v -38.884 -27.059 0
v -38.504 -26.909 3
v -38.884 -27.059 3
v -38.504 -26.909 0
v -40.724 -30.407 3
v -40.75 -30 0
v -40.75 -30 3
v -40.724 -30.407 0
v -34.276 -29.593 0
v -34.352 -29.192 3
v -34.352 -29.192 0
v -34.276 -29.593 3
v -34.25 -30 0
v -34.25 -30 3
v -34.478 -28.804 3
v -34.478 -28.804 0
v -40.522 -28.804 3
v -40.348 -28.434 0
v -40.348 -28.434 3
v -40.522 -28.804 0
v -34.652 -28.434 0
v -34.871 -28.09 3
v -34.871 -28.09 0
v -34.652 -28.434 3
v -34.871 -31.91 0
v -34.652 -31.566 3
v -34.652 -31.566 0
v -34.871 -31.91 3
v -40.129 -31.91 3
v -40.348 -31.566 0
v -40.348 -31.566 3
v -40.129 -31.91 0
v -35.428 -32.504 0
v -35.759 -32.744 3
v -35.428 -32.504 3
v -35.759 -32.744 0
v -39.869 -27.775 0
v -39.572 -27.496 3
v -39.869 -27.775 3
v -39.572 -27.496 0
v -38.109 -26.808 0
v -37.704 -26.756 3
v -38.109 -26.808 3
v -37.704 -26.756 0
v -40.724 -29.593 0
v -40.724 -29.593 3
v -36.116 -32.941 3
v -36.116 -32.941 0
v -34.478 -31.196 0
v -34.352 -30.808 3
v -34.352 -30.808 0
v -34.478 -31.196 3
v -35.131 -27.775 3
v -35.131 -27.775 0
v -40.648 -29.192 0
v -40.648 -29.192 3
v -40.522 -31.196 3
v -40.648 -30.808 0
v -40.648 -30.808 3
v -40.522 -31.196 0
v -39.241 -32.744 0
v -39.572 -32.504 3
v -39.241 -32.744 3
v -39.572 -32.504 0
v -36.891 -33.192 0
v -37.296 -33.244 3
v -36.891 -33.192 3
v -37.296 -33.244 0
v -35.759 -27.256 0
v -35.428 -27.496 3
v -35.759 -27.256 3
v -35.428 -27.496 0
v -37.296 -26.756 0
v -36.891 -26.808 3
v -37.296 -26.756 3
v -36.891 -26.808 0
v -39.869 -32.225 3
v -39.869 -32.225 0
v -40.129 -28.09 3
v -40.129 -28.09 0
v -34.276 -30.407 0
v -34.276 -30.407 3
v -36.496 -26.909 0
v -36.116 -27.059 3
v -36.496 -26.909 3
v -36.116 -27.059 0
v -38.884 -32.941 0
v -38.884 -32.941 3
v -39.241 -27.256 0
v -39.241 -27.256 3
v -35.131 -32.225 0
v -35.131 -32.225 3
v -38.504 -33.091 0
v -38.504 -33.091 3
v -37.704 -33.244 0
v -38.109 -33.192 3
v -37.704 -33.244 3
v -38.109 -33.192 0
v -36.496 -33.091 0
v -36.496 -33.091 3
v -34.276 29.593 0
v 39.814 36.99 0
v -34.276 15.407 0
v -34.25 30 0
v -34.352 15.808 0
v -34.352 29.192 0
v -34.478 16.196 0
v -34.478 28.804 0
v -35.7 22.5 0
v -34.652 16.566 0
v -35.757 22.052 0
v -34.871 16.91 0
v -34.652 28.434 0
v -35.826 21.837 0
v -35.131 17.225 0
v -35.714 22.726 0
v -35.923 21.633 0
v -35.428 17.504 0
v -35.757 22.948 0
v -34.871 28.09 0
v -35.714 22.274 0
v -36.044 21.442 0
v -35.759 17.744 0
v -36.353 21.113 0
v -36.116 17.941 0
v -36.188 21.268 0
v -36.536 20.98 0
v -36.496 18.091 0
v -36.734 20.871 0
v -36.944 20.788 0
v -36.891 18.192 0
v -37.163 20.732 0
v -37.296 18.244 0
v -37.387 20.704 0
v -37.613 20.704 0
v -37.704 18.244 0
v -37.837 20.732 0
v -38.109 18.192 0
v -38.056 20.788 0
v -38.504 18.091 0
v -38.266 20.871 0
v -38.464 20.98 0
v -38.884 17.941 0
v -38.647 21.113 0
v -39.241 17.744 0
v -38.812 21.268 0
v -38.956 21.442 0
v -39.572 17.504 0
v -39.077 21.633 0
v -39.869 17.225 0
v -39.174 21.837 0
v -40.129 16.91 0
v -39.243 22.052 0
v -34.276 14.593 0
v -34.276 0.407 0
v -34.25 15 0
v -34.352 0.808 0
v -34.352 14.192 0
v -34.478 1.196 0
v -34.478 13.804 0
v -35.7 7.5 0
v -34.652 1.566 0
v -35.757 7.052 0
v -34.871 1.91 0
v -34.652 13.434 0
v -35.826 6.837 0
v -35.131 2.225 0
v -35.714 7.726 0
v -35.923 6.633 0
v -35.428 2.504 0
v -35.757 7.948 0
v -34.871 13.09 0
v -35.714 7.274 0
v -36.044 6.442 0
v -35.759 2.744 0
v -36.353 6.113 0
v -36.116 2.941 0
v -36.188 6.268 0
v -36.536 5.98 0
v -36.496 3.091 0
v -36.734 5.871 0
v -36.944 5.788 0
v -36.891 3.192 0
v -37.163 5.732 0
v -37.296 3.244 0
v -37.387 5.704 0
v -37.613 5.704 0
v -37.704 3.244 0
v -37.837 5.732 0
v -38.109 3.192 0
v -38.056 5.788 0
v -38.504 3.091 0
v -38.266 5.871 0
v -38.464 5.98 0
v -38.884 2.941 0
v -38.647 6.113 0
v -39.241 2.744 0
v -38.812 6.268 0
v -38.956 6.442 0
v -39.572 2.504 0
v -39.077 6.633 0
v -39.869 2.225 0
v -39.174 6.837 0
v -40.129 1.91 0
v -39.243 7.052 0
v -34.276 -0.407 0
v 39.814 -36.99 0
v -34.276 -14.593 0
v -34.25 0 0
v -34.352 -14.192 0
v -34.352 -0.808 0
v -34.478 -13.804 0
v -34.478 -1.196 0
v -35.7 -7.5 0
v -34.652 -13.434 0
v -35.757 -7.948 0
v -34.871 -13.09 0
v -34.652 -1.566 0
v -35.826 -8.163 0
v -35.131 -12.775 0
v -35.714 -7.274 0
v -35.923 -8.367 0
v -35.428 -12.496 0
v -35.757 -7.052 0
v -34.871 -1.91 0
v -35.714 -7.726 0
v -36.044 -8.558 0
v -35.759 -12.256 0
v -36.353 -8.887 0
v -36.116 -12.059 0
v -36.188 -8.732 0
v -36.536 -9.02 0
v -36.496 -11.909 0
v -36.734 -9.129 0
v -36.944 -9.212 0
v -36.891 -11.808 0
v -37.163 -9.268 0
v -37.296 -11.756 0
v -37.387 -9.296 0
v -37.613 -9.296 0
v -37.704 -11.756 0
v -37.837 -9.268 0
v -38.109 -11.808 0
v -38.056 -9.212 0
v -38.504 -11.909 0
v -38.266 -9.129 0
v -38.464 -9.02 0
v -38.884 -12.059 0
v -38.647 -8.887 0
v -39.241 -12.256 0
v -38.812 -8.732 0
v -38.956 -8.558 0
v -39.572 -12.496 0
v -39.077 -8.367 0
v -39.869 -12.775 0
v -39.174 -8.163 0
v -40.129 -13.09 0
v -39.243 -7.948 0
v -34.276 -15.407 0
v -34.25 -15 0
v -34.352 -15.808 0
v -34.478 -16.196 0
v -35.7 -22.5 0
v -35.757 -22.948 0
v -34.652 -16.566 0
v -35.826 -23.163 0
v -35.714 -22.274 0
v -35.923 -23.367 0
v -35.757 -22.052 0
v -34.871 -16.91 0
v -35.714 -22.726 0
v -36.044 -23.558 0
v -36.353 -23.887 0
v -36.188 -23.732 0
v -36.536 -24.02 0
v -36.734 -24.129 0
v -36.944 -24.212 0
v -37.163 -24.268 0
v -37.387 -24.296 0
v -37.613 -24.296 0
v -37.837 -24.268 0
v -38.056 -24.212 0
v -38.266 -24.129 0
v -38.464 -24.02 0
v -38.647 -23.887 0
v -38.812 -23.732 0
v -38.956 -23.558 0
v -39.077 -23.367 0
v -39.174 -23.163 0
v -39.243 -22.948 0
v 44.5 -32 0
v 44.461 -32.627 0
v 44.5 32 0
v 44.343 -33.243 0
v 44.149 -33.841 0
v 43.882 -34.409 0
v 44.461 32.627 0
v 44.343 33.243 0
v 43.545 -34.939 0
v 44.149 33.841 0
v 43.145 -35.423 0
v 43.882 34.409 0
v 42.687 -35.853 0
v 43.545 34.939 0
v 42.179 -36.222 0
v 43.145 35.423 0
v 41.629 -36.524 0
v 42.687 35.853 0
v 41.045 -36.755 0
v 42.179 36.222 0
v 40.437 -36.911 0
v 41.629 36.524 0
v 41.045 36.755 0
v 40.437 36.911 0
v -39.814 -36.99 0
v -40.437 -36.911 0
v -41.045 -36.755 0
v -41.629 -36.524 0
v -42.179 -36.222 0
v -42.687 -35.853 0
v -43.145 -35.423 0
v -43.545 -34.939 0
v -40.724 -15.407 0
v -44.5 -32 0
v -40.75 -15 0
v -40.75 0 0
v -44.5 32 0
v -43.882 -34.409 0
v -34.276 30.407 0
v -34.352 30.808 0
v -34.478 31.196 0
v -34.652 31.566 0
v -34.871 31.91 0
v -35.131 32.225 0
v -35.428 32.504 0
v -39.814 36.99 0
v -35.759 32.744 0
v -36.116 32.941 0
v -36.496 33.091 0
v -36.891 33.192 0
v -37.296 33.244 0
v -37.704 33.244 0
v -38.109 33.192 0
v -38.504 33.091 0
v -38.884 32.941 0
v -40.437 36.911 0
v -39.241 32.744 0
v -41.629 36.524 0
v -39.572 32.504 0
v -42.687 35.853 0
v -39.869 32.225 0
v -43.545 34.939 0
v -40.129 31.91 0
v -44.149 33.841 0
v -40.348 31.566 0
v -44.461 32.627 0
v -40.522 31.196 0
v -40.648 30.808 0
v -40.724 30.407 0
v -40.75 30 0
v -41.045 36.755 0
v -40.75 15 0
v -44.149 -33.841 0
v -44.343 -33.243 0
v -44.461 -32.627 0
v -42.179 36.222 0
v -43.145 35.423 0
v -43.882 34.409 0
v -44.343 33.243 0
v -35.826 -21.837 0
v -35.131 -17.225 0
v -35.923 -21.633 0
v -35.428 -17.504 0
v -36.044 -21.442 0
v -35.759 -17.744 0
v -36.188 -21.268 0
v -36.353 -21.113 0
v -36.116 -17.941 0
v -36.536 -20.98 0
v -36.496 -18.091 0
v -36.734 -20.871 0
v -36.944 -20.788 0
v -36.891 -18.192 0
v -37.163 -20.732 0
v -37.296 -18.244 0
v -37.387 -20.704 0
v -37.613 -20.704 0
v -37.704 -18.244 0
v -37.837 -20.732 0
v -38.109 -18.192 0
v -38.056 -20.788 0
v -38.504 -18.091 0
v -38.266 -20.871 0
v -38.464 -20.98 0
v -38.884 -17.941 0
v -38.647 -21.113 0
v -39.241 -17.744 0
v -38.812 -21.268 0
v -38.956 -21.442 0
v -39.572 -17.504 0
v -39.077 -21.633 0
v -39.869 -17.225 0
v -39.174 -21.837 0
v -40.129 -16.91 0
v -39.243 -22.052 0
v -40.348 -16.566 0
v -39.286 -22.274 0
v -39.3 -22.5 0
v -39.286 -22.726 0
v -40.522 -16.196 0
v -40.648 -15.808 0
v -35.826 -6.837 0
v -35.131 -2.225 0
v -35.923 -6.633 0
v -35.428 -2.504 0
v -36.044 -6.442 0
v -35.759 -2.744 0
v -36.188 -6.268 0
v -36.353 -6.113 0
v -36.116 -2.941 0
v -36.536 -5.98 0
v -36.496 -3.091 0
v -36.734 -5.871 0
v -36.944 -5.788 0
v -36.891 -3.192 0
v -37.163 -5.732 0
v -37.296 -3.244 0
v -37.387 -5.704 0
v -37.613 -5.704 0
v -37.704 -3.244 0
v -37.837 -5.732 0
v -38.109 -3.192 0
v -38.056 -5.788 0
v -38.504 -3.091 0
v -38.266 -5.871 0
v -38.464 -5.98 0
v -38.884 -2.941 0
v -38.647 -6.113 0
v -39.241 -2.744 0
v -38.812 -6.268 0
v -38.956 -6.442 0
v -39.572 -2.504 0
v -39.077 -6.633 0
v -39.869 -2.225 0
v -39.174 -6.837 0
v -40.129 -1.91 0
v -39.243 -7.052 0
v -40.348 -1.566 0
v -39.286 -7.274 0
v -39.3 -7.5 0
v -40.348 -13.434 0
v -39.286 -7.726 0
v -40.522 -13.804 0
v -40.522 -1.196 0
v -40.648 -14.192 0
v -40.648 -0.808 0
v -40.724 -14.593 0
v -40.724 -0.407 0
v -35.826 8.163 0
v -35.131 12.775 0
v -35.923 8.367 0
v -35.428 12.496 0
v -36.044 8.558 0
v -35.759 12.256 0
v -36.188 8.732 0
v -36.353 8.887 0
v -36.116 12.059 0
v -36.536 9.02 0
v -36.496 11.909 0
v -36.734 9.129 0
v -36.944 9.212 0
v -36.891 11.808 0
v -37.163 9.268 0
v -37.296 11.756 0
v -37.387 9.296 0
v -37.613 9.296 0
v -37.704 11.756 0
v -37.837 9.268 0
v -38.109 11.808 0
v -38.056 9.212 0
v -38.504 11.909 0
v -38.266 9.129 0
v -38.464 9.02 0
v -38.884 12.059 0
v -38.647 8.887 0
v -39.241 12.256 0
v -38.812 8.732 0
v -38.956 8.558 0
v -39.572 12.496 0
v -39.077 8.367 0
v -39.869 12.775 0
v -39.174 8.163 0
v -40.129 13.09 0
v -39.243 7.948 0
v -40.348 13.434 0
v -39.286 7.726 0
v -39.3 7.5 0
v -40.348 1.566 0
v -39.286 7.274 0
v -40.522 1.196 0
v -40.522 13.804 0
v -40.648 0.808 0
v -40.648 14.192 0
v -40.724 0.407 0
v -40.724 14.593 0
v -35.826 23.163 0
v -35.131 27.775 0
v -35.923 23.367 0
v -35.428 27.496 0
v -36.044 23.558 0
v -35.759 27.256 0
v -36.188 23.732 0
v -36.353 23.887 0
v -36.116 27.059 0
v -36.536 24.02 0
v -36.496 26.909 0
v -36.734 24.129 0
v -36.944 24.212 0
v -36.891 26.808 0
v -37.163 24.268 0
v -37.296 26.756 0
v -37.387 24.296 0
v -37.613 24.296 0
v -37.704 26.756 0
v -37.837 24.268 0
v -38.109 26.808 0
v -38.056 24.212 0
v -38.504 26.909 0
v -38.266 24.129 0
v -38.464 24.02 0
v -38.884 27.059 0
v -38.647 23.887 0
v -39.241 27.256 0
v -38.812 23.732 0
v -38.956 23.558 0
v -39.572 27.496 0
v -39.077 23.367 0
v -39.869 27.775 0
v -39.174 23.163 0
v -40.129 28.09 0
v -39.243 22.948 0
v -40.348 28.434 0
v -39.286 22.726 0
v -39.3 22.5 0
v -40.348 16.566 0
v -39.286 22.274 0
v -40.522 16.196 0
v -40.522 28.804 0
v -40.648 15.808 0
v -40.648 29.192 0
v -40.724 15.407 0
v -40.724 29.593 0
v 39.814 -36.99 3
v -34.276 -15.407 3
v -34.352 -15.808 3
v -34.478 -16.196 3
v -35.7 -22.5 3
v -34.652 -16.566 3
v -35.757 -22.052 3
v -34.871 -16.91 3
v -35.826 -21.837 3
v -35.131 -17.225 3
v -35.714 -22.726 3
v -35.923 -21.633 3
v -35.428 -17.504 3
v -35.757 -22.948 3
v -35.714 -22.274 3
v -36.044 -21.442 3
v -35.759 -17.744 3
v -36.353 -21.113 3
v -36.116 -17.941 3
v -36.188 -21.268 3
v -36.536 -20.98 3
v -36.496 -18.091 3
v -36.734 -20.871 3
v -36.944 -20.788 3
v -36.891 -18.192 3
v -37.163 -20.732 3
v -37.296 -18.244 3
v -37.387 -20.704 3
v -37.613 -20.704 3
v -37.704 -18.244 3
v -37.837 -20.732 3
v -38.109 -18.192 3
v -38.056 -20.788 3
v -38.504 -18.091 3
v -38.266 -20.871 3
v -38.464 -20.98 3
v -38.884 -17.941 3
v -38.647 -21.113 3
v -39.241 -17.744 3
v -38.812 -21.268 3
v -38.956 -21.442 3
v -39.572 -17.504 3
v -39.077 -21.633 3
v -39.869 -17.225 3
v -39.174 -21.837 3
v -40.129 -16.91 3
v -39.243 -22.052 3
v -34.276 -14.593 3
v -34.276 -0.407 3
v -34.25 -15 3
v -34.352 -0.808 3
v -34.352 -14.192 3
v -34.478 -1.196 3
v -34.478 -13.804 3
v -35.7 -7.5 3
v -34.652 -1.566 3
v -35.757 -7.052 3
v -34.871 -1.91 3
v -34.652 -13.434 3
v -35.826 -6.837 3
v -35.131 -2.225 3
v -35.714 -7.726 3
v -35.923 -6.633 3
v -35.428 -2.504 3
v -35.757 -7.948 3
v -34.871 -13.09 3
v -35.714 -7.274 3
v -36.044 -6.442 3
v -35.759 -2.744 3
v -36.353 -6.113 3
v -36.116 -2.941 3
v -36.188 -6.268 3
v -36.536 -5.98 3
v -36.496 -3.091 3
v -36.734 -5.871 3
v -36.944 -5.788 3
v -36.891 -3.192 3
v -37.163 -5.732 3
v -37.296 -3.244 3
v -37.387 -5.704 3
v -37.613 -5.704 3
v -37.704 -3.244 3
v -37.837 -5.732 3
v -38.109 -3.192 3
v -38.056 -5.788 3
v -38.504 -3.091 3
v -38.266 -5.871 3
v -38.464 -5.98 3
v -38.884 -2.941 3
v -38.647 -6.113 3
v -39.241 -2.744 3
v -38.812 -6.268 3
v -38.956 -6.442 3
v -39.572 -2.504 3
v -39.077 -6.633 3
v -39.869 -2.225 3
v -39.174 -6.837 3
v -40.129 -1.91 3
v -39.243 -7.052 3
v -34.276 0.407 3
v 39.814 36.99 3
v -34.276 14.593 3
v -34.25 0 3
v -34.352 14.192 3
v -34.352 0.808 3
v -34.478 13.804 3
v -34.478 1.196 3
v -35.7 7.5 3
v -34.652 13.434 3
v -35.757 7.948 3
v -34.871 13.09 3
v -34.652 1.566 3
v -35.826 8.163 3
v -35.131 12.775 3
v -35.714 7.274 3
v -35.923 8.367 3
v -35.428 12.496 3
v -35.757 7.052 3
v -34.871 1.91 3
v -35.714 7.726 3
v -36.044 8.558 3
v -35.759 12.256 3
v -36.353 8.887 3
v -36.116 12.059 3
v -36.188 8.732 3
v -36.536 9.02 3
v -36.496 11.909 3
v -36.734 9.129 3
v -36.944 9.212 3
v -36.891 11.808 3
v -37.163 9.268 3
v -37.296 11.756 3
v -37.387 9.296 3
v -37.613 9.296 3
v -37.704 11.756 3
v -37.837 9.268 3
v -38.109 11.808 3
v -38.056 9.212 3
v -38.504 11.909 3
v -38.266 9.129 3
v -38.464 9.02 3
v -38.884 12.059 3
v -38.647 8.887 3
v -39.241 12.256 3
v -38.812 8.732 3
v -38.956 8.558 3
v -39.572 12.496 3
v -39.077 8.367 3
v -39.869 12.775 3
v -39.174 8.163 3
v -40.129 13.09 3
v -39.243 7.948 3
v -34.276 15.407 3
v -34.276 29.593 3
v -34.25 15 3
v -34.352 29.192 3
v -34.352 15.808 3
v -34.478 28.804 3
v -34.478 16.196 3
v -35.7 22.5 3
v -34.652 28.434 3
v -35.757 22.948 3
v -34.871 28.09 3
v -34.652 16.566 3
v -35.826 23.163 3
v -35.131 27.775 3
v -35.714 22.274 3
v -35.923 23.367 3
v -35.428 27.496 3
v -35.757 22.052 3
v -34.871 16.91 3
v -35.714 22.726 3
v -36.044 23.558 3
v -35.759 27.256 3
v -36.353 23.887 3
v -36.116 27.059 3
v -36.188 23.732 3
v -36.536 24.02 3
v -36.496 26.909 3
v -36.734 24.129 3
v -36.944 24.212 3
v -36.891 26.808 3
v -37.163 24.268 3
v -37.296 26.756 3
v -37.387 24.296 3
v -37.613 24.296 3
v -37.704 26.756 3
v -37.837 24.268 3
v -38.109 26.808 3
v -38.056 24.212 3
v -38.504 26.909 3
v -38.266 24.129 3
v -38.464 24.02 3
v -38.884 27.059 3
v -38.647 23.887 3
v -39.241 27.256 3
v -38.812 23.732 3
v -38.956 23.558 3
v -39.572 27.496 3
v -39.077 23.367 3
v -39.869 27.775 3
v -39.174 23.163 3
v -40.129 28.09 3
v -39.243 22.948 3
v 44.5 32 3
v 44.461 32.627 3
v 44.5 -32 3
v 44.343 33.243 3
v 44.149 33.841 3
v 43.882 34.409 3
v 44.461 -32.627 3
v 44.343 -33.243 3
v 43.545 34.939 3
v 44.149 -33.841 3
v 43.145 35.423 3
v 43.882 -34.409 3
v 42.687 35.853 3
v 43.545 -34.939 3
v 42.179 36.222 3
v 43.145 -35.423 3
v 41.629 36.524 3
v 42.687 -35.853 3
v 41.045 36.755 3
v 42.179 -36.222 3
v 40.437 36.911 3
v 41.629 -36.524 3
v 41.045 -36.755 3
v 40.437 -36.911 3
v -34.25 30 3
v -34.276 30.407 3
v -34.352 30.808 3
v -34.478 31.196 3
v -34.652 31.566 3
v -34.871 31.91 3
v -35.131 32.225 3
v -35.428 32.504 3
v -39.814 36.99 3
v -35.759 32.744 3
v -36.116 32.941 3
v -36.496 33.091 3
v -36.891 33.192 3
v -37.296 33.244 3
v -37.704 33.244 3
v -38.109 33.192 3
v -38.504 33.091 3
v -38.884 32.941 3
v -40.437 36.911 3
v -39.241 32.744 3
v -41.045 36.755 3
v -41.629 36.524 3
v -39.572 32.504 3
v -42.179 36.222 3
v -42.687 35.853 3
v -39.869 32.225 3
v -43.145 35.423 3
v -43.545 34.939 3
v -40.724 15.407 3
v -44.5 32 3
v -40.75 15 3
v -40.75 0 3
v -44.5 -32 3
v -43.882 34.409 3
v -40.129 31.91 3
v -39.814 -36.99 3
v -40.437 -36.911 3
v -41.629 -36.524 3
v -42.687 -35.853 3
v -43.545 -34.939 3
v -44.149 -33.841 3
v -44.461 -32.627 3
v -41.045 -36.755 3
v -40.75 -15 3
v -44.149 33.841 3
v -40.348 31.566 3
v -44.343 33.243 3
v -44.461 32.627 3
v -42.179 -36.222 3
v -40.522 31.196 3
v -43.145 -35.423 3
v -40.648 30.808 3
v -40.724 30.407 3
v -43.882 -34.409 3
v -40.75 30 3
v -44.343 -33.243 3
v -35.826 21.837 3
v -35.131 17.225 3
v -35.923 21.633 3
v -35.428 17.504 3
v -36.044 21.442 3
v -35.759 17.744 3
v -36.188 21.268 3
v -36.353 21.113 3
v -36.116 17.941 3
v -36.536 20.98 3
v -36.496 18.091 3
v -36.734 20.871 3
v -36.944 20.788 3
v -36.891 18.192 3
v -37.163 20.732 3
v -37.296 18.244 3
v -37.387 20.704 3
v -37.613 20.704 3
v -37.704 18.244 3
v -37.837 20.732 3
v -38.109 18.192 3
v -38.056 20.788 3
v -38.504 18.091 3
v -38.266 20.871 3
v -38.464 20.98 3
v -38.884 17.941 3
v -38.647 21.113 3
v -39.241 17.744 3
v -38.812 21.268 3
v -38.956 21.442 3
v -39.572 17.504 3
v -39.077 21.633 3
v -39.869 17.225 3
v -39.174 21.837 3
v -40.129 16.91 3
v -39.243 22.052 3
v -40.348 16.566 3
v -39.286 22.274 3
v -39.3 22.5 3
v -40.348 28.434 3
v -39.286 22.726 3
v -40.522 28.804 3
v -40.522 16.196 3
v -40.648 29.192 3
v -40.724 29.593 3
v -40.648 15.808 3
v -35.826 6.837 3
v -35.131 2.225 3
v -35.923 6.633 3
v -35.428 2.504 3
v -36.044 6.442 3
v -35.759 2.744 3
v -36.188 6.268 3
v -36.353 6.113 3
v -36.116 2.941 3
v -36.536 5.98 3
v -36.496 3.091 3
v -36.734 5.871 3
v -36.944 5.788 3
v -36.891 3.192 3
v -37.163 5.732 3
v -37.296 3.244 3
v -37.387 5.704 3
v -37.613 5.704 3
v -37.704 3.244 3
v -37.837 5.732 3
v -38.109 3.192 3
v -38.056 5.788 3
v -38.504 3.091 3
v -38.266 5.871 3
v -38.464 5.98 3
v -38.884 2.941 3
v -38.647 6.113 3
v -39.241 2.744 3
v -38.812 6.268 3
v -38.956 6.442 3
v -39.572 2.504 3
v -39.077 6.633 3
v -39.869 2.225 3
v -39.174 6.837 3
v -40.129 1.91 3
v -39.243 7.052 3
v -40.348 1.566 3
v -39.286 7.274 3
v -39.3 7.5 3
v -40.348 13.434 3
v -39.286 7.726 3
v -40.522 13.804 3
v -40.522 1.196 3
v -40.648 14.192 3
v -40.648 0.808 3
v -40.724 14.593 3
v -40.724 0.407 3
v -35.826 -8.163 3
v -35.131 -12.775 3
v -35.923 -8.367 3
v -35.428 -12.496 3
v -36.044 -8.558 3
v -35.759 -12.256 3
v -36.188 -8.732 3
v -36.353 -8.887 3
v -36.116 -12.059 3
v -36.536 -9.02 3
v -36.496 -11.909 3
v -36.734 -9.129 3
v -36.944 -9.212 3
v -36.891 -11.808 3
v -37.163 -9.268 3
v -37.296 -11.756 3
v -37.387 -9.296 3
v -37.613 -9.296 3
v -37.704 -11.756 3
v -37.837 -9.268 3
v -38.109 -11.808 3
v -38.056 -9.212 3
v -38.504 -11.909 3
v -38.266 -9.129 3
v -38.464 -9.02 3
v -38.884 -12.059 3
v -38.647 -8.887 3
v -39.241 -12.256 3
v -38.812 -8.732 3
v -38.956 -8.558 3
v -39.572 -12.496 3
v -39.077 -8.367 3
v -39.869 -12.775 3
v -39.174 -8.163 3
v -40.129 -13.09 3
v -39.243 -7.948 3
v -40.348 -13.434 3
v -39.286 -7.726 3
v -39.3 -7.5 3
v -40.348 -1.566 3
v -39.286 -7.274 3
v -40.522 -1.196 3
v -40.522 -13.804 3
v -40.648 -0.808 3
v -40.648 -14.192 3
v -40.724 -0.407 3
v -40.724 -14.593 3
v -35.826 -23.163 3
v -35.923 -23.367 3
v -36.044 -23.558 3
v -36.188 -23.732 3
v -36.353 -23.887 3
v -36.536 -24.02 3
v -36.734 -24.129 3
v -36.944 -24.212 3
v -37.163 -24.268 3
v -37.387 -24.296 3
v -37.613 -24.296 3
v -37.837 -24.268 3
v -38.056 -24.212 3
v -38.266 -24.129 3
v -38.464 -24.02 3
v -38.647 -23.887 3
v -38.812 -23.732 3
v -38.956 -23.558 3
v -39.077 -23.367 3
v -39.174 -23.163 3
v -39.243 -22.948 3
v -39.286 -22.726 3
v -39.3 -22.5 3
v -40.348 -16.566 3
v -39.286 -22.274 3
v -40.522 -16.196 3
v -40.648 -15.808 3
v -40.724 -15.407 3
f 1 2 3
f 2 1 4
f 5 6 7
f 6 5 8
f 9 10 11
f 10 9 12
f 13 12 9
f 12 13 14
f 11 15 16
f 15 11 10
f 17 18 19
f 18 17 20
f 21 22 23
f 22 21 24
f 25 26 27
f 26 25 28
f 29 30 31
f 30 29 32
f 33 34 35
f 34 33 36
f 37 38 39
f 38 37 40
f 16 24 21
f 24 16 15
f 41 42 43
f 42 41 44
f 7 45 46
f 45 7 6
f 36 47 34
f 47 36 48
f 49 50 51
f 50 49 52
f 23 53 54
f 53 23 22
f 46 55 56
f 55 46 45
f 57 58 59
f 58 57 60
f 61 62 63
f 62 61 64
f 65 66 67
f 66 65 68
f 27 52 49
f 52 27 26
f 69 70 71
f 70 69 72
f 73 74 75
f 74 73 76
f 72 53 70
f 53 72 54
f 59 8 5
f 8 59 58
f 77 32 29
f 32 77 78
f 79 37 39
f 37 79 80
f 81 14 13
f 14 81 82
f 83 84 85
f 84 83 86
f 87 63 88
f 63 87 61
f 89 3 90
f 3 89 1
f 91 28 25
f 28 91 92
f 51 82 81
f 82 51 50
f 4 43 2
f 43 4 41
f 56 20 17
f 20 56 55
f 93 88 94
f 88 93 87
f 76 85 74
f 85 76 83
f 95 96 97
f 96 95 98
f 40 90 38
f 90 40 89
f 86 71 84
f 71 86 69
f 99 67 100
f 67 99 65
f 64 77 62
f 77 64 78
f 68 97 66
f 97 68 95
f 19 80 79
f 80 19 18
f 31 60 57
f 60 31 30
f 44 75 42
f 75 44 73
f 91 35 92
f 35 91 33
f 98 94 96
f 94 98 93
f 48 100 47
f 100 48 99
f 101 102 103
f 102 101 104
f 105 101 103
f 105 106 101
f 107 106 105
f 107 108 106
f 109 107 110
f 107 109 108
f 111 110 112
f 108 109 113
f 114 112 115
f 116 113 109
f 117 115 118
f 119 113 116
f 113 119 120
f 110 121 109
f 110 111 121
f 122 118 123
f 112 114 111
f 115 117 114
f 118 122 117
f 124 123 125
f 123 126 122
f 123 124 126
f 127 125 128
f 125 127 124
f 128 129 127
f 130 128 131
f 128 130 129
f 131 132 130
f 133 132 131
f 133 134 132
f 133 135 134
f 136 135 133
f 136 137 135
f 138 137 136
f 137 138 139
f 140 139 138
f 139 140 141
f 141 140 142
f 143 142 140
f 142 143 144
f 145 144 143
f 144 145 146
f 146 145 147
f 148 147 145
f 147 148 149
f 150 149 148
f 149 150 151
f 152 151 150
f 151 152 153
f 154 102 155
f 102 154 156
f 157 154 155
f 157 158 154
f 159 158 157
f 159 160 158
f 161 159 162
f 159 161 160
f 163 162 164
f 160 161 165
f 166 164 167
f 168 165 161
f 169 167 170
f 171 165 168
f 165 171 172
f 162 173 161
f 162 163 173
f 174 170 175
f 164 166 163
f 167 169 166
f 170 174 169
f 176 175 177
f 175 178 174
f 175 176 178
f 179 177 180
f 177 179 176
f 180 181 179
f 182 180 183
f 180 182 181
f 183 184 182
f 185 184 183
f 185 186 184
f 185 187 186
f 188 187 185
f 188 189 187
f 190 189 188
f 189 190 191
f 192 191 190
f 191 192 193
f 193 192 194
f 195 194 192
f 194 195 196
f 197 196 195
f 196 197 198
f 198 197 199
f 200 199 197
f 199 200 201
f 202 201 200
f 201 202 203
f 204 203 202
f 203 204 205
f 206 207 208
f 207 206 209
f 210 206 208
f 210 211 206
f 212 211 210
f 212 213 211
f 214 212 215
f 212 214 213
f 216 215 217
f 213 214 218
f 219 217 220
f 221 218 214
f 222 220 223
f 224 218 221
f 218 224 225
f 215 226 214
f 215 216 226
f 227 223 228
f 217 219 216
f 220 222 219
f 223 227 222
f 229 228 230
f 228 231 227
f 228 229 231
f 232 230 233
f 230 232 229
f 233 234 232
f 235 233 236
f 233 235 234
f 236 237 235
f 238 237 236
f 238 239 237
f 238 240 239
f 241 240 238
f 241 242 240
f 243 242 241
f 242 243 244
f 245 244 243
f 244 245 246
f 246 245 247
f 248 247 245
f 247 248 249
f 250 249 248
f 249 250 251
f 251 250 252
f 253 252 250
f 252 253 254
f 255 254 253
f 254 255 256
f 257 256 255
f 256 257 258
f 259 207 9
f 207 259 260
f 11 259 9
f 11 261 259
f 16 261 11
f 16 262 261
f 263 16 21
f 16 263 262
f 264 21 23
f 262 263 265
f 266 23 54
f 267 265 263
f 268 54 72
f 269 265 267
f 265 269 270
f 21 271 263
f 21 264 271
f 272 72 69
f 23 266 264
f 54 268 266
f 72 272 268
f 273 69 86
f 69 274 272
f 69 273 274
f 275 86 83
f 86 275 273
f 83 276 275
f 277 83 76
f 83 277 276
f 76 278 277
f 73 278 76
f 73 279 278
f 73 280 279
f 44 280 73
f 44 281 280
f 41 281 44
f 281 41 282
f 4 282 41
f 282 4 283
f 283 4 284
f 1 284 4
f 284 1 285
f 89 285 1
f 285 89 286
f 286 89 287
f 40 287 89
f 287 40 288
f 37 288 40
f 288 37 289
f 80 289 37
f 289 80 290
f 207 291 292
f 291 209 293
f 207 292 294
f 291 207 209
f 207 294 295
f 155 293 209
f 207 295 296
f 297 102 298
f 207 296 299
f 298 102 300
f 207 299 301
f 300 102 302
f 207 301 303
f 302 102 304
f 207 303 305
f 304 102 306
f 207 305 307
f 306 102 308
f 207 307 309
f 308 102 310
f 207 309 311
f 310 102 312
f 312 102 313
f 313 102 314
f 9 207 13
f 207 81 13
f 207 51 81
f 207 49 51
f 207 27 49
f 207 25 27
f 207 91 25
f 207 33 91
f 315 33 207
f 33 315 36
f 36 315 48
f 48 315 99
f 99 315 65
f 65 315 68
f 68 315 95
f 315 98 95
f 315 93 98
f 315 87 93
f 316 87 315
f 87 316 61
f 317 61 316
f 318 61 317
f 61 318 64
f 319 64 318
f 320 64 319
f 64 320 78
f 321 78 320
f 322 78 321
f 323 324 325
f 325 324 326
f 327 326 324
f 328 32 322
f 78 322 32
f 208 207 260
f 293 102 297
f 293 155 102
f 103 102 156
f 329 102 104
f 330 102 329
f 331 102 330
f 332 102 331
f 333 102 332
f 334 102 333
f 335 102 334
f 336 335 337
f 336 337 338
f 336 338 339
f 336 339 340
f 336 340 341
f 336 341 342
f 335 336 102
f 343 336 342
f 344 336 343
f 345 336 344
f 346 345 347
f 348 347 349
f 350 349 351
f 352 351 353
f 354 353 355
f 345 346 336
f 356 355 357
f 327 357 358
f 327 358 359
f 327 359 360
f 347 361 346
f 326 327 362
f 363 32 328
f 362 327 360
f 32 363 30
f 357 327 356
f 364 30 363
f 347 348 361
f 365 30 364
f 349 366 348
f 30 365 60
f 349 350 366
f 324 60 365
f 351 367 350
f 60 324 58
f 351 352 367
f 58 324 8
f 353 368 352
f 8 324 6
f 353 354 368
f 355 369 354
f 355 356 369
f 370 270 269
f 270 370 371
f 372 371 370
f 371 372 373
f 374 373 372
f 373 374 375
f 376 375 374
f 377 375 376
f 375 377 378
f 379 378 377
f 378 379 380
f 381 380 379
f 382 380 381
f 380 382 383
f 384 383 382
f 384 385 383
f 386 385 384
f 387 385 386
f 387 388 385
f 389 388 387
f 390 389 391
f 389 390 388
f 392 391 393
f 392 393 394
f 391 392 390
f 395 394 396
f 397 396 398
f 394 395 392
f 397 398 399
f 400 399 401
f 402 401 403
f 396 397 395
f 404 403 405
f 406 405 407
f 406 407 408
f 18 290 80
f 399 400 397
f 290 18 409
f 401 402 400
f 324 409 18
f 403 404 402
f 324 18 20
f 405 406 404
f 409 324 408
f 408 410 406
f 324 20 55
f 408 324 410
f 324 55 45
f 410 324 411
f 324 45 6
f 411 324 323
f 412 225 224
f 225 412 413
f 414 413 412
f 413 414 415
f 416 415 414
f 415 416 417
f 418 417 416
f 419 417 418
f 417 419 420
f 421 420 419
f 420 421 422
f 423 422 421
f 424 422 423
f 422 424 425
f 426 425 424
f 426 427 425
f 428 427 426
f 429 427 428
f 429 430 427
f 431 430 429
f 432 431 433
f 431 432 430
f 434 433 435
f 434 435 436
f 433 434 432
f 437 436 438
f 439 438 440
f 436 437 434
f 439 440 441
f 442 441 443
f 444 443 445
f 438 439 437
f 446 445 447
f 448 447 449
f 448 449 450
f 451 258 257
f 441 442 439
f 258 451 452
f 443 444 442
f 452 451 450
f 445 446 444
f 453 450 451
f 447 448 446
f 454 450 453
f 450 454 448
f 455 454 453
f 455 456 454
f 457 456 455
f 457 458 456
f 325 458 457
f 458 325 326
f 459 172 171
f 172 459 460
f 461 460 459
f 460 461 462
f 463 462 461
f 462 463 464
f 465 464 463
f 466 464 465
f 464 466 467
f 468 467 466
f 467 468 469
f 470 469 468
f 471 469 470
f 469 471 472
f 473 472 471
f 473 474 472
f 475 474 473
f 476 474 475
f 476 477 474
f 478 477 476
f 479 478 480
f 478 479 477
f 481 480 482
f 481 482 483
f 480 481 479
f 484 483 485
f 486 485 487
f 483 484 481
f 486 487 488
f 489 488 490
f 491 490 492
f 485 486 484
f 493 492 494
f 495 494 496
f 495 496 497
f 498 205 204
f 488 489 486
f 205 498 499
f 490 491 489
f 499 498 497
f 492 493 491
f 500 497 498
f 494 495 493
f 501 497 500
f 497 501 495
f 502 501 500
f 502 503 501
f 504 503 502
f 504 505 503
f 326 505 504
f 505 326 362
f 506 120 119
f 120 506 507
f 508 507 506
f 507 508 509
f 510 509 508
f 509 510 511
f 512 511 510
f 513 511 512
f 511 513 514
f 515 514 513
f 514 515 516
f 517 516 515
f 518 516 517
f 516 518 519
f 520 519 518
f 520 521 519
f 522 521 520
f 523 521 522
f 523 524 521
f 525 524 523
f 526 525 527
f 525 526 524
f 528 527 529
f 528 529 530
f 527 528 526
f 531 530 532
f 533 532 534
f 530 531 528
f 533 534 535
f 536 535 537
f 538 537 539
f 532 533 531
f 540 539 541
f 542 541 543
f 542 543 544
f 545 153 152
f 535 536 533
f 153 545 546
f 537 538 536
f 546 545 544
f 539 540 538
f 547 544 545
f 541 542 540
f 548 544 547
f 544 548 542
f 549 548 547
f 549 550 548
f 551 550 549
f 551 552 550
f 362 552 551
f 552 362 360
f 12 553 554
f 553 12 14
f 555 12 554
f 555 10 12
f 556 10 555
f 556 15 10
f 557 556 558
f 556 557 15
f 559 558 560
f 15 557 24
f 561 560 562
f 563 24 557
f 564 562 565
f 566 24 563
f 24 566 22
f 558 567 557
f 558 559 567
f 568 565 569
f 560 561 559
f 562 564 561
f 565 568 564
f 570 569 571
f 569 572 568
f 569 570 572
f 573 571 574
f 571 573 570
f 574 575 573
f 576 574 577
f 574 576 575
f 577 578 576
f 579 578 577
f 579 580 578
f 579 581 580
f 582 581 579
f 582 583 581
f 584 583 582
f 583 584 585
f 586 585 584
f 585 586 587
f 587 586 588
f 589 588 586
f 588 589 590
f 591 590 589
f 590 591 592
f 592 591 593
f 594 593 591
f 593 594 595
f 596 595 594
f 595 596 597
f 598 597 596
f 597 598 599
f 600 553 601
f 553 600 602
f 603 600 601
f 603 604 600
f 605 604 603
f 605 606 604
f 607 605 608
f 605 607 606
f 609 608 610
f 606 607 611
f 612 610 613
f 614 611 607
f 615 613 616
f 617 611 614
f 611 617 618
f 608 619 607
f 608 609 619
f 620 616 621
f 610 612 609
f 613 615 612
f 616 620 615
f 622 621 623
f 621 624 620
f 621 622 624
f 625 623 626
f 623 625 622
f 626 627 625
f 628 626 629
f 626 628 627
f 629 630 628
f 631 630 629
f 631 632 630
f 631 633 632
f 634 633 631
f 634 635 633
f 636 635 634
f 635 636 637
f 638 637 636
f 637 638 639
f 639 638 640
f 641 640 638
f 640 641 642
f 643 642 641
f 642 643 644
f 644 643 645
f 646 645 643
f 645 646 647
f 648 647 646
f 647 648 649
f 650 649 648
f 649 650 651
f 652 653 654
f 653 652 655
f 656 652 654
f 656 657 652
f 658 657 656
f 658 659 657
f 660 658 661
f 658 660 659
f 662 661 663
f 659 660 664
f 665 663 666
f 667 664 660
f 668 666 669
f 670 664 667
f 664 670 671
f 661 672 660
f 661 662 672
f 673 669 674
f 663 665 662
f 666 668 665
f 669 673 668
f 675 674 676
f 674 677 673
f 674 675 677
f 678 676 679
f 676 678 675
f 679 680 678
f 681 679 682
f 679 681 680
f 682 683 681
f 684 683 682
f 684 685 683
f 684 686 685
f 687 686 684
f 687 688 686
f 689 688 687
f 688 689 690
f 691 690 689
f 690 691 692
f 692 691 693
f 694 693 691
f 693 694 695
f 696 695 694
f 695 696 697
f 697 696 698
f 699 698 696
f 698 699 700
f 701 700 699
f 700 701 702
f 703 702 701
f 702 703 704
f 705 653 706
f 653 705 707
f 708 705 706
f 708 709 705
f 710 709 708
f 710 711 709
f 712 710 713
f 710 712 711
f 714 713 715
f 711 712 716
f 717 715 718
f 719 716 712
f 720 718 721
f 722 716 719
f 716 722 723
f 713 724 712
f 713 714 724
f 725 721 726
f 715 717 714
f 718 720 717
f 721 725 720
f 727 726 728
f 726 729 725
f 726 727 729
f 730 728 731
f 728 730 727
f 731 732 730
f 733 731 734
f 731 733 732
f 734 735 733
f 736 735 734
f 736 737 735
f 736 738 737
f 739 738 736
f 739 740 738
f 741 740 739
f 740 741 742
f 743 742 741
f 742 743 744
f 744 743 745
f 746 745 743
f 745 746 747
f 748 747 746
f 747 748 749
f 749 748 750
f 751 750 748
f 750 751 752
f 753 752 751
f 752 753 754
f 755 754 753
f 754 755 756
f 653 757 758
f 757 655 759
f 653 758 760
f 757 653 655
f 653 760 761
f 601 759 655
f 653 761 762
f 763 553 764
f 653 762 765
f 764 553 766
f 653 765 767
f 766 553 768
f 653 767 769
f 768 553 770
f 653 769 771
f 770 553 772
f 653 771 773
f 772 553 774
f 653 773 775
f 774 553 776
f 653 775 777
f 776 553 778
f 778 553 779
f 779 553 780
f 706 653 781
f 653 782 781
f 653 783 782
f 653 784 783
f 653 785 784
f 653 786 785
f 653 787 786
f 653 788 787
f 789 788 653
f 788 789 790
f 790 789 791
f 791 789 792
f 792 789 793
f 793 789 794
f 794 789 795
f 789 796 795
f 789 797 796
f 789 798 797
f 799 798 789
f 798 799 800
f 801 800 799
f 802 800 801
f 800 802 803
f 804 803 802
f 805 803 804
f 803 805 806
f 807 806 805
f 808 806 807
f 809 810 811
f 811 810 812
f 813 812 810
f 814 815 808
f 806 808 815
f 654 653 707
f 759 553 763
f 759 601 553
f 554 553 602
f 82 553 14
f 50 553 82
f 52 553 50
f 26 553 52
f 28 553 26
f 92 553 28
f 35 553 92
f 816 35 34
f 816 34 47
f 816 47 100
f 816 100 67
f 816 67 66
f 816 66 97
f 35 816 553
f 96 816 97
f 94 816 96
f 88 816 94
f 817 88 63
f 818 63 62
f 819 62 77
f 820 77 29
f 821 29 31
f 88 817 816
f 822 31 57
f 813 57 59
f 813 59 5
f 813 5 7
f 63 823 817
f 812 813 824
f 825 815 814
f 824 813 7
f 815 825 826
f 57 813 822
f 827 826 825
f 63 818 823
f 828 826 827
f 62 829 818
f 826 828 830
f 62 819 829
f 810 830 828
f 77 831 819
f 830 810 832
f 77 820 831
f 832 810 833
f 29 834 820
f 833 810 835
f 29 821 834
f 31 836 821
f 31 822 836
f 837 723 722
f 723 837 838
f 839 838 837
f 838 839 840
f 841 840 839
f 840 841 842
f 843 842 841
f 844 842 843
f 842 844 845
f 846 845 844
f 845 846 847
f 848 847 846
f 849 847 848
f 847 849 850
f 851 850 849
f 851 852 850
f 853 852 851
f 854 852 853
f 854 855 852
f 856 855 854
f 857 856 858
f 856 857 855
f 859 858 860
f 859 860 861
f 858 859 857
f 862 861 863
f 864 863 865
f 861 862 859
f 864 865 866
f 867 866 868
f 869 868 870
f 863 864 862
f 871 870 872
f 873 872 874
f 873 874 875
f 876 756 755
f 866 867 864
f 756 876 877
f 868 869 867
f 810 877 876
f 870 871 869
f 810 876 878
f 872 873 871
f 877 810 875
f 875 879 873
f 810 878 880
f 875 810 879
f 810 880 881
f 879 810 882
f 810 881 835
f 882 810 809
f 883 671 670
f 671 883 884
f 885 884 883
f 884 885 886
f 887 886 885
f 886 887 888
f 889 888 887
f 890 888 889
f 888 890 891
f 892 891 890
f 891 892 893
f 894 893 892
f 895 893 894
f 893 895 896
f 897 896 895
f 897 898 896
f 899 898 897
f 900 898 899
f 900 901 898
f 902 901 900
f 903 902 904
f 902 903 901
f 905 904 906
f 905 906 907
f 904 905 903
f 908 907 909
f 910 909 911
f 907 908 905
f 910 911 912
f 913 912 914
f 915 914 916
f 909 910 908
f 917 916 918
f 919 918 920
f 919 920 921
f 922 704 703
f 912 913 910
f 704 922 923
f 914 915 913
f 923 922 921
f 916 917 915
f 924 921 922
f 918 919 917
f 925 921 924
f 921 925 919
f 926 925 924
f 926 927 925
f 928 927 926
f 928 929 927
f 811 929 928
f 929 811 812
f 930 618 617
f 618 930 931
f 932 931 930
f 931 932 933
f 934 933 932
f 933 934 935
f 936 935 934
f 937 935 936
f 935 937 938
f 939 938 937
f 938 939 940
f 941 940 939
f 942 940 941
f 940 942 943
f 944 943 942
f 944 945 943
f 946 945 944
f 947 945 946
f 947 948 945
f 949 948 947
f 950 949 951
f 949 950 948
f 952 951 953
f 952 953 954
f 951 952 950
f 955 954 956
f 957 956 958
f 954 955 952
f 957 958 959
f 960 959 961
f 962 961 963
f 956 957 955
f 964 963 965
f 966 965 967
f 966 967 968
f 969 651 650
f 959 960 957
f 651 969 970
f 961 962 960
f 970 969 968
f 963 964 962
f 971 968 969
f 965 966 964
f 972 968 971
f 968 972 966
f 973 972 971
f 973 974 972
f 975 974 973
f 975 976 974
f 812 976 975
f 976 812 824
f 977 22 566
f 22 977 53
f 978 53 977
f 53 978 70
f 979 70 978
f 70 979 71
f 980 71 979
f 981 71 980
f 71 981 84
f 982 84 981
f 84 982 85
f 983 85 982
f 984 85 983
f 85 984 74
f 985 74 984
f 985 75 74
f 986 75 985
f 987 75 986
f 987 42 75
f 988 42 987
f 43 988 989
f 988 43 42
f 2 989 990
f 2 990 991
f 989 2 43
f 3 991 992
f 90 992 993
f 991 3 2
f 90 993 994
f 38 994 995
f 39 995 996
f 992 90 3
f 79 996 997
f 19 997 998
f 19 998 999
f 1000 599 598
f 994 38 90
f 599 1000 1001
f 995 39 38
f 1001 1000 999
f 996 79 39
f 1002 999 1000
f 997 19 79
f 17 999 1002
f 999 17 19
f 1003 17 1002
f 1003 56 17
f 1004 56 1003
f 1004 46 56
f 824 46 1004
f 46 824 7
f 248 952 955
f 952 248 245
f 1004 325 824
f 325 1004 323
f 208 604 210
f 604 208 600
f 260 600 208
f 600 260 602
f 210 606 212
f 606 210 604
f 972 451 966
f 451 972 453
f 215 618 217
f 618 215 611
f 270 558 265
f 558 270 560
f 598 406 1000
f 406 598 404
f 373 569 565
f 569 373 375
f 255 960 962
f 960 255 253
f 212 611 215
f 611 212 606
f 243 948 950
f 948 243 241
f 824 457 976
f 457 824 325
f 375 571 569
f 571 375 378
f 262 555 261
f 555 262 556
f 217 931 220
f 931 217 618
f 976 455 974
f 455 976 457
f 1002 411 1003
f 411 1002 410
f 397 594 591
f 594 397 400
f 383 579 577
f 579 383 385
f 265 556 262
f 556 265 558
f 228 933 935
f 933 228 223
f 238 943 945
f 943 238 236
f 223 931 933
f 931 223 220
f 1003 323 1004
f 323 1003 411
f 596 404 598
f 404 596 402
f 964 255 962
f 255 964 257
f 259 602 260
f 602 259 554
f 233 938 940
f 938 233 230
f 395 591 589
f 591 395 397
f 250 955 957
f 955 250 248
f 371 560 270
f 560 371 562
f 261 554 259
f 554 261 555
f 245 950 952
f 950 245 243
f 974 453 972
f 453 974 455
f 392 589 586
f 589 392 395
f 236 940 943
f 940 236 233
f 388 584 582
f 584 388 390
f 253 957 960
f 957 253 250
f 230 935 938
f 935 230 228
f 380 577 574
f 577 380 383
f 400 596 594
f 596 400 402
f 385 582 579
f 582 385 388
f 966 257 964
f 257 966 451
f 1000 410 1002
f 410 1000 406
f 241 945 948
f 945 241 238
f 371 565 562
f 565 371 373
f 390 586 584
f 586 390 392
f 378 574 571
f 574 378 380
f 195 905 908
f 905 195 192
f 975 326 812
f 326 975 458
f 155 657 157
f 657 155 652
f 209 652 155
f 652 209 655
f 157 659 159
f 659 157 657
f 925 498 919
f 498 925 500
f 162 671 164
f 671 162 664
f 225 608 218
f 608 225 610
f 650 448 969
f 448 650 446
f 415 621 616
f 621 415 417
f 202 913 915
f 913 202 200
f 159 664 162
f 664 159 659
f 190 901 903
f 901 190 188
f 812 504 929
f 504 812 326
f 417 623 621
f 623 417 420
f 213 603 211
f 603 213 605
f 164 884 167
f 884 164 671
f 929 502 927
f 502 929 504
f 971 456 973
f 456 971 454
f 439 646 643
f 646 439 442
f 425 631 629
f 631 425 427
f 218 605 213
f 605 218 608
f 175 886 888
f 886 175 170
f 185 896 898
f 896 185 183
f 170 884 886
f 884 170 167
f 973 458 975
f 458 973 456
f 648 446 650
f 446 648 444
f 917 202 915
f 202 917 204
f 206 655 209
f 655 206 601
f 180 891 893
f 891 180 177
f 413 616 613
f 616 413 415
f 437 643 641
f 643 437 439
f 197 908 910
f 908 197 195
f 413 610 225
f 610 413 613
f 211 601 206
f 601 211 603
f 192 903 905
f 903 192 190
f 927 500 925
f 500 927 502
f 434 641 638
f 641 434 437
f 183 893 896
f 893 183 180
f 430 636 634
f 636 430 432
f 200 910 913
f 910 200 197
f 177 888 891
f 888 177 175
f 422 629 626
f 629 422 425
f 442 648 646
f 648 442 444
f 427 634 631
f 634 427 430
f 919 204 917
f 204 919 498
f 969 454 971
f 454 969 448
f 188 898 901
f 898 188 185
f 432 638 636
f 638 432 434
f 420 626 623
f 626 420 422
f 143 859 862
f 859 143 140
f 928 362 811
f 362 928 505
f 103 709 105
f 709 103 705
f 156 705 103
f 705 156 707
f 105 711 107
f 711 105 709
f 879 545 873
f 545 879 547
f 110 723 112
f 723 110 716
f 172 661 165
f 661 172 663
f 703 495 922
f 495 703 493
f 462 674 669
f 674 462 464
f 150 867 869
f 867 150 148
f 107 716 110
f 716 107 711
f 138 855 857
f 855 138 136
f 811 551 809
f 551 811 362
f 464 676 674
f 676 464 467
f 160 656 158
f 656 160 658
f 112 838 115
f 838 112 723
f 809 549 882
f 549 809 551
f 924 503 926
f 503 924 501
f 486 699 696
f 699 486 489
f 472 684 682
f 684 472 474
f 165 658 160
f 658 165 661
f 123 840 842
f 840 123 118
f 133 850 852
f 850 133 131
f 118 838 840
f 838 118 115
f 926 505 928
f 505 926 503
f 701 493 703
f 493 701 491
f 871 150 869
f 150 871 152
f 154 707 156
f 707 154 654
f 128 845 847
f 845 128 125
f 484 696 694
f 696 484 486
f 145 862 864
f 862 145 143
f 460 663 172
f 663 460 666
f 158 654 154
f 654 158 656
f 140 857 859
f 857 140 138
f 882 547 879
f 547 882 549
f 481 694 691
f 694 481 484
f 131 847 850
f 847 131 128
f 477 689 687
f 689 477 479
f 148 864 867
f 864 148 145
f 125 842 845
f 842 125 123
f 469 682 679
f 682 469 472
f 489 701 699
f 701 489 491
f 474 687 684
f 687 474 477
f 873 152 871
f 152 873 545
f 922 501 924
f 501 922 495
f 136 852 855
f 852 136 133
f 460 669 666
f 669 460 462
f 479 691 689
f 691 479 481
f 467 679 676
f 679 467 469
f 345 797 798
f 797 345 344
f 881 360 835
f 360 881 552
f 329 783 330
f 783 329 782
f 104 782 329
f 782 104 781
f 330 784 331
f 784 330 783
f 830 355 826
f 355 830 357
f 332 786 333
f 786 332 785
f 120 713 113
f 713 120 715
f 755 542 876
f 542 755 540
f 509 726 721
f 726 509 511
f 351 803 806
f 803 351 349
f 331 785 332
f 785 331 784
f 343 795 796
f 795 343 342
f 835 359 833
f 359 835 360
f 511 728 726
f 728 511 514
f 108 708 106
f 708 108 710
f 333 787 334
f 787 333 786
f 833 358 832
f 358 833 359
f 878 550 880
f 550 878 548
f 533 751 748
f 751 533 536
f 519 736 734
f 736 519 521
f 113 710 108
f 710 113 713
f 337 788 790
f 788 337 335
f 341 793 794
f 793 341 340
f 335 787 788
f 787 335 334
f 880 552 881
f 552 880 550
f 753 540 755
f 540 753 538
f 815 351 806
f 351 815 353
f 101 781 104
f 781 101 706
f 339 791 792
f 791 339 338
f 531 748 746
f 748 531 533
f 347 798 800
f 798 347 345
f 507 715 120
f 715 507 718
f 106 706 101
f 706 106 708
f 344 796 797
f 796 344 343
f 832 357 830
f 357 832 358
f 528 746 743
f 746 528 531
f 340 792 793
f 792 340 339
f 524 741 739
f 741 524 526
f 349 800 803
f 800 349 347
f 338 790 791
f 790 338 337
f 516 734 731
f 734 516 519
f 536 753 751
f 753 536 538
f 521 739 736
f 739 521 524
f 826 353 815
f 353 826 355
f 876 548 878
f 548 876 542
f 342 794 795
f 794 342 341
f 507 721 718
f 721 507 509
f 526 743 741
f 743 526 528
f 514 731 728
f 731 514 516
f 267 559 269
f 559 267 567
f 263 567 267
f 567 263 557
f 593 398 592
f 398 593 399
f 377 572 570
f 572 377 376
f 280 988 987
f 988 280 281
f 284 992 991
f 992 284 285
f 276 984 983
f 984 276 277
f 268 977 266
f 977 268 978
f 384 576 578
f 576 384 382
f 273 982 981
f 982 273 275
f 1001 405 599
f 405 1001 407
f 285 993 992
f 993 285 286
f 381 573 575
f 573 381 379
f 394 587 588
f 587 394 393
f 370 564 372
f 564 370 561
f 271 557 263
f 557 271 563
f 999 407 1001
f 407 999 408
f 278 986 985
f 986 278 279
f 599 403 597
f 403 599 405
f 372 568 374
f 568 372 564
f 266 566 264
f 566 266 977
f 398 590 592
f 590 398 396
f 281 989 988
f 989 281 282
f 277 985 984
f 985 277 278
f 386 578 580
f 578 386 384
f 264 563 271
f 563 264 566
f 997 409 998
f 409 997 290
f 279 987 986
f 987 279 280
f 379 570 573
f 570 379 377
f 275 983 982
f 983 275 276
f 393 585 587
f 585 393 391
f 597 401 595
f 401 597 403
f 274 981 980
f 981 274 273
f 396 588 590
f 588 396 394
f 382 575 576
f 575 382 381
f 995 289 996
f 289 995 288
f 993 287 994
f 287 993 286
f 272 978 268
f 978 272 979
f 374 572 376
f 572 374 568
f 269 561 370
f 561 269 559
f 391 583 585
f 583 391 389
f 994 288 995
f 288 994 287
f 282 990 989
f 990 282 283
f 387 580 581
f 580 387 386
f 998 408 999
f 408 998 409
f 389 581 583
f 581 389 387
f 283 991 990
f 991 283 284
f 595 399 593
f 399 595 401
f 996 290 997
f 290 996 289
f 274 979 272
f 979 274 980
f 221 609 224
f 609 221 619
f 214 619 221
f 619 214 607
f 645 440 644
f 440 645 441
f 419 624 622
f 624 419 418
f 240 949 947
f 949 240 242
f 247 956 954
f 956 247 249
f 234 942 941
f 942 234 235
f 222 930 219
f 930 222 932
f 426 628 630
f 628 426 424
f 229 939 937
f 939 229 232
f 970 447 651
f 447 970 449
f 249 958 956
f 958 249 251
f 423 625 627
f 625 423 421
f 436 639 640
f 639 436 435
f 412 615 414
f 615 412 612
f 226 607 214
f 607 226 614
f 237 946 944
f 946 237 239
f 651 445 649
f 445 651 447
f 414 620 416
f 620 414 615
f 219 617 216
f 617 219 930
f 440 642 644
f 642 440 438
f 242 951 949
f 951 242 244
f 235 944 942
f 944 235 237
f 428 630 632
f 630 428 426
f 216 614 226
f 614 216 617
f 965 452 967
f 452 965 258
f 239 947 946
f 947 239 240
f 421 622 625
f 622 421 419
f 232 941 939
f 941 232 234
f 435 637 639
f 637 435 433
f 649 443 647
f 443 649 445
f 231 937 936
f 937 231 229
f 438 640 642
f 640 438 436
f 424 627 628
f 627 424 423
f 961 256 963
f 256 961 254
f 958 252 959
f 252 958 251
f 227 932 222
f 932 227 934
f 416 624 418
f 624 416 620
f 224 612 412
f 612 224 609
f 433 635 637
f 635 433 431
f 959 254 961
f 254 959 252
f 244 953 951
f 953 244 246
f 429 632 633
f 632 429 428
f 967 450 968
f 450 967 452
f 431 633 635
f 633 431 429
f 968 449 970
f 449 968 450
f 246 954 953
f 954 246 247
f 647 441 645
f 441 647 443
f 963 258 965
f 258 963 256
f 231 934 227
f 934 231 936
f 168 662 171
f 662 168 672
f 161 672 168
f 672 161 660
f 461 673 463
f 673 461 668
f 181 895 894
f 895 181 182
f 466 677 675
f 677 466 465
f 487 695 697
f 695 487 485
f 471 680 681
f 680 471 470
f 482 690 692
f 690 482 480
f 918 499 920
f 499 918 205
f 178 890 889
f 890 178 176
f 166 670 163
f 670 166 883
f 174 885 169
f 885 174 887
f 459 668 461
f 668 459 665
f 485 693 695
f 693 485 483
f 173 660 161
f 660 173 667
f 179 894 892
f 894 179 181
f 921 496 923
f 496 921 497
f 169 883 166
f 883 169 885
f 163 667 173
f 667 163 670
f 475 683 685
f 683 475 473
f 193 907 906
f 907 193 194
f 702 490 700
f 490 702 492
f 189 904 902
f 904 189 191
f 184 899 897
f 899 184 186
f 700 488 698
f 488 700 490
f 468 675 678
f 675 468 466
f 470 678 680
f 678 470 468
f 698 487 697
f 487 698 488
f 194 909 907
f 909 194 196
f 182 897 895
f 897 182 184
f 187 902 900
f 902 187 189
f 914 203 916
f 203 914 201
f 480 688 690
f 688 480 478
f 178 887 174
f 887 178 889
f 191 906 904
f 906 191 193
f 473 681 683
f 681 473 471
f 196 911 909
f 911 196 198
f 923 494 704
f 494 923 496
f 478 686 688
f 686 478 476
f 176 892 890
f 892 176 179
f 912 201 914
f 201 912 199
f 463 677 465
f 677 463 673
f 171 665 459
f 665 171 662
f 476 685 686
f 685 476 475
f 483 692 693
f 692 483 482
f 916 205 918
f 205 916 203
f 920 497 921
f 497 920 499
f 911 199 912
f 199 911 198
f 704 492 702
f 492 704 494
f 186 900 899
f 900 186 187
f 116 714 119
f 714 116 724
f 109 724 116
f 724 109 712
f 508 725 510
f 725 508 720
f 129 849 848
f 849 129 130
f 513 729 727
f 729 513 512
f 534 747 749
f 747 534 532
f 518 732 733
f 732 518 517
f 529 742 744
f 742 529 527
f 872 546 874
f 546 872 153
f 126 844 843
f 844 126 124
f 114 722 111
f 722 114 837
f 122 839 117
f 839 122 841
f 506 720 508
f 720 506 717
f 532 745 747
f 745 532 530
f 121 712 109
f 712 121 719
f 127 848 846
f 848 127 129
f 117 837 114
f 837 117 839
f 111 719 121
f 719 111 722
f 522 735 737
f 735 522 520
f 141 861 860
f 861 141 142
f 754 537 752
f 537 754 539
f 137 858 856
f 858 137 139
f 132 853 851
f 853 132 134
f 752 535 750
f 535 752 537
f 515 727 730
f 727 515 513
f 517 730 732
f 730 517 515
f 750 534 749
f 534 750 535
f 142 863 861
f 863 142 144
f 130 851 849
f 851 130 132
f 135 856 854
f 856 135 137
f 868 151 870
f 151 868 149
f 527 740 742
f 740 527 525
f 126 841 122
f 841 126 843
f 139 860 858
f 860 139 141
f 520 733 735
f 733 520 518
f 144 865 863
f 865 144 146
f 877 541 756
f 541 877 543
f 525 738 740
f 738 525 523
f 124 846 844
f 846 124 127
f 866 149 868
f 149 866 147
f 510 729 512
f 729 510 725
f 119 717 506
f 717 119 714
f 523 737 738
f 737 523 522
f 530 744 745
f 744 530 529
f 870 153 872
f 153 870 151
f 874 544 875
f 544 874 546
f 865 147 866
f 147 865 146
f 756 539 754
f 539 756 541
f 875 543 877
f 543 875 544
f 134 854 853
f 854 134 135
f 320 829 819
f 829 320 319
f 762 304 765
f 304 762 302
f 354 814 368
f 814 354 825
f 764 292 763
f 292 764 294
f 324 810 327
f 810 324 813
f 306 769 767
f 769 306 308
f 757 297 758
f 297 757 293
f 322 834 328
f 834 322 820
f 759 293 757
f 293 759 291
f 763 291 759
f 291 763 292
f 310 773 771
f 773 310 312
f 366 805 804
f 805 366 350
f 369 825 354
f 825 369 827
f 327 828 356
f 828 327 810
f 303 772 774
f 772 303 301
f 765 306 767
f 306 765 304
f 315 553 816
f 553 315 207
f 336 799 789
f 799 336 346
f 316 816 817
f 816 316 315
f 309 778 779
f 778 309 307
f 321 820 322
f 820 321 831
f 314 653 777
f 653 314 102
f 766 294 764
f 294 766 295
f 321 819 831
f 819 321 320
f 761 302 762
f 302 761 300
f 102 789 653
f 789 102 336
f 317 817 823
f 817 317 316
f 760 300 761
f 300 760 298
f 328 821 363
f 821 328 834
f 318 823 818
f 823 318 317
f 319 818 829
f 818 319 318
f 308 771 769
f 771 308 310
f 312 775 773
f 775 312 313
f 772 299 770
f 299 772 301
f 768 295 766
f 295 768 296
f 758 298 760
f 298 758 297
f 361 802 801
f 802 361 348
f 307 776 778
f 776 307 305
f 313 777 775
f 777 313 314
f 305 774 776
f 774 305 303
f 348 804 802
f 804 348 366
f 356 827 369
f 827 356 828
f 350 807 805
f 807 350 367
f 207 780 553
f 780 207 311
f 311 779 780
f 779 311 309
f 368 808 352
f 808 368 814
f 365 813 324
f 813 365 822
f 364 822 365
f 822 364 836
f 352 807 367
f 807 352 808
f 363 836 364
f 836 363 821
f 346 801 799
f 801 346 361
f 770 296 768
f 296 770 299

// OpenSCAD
$fn = 50;


difference() {
	union() {
		hull() {
			translate(v = [-39.5000000000, 32.0000000000, 0]) {
				cylinder(h = 3, r = 5);
			}
			translate(v = [39.5000000000, 32.0000000000, 0]) {
				cylinder(h = 3, r = 5);
			}
			translate(v = [-39.5000000000, -32.0000000000, 0]) {
				cylinder(h = 3, r = 5);
			}
			translate(v = [39.5000000000, -32.0000000000, 0]) {
				cylinder(h = 3, r = 5);
			}
		}
	}
	union() {
		translate(v = [-37.5000000000, -30.0000000000, 0]) {
			cylinder(h = 3, r = 3.2500000000);
		}
		translate(v = [-37.5000000000, -15.0000000000, 0]) {
			cylinder(h = 3, r = 3.2500000000);
		}
		translate(v = [-37.5000000000, 0.0000000000, 0]) {
			cylinder(h = 3, r = 3.2500000000);
		}
		translate(v = [-37.5000000000, 15.0000000000, 0]) {
			cylinder(h = 3, r = 3.2500000000);
		}
		translate(v = [-37.5000000000, 30.0000000000, 0]) {
			cylinder(h = 3, r = 3.2500000000);
		}
		translate(v = [-37.5000000000, -30.0000000000, 0]) {
			cylinder(h = 3, r = 1.8000000000);
		}
		translate(v = [-37.5000000000, -22.5000000000, 0]) {
			cylinder(h = 3, r = 1.8000000000);
		}
		translate(v = [-37.5000000000, -15.0000000000, 0]) {
			cylinder(h = 3, r = 1.8000000000);
		}
		translate(v = [-37.5000000000, -7.5000000000, 0]) {
			cylinder(h = 3, r = 1.8000000000);
		}
		translate(v = [-37.5000000000, 0.0000000000, 0]) {
			cylinder(h = 3, r = 1.8000000000);
		}
		translate(v = [-37.5000000000, 7.5000000000, 0]) {
			cylinder(h = 3, r = 1.8000000000);
		}
		translate(v = [-37.5000000000, 15.0000000000, 0]) {
			cylinder(h = 3, r = 1.8000000000);
		}
		translate(v = [-37.5000000000, 22.5000000000, 0]) {
			cylinder(h = 3, r = 1.8000000000);
		}
		translate(v = [-37.5000000000, 30.0000000000, 0]) {
			cylinder(h = 3, r = 1.8000000000);
		}
		translate(v = [-37.5000000000, -30.0000000000, 0]) {
			cylinder(h = 3, r = 1.8000000000);
		}
		translate(v = [-37.5000000000, -22.5000000000, 0]) {
			cylinder(h = 3, r = 1.8000000000);
		}
		translate(v = [-37.5000000000, -15.0000000000, 0]) {
			cylinder(h = 3, r = 1.8000000000);
		}
		translate(v = [-37.5000000000, -7.5000000000, 0]) {
			cylinder(h = 3, r = 1.8000000000);
		}
		translate(v = [-37.5000000000, 0.0000000000, 0]) {
			cylinder(h = 3, r = 1.8000000000);
		}
		translate(v = [-37.5000000000, 7.5000000000, 0]) {
			cylinder(h = 3, r = 1.8000000000);
		}
		translate(v = [-37.5000000000, 15.0000000000, 0]) {
			cylinder(h = 3, r = 1.8000000000);
		}
		translate(v = [-37.5000000000, 22.5000000000, 0]) {
			cylinder(h = 3, r = 1.8000000000);
		}
		translate(v = [-37.5000000000, 30.0000000000, 0]) {
			cylinder(h = 3, r = 1.8000000000);
		}
		translate(v = [-37.5000000000, -30.0000000000, 0]) {
			cylinder(h = 3, r = 1.8000000000);
		}
		translate(v = [-37.5000000000, -22.5000000000, 0]) {
			cylinder(h = 3, r = 1.8000000000);
		}
		translate(v = [-37.5000000000, -15.0000000000, 0]) {
			cylinder(h = 3, r = 1.8000000000);
		}
		translate(v = [-37.5000000000, -7.5000000000, 0]) {
			cylinder(h = 3, r = 1.8000000000);
		}
		translate(v = [-37.5000000000, 0.0000000000, 0]) {
			cylinder(h = 3, r = 1.8000000000);
		}
		translate(v = [-37.5000000000, 7.5000000000, 0]) {
			cylinder(h = 3, r = 1.8000000000);
		}
		translate(v = [-37.5000000000, 15.0000000000, 0]) {
			cylinder(h = 3, r = 1.8000000000);
		}
		translate(v = [-37.5000000000, 22.5000000000, 0]) {
			cylinder(h = 3, r = 1.8000000000);
		}
		translate(v = [-37.5000000000, 30.0000000000, 0]) {
			cylinder(h = 3, r = 1.8000000000);
		}
	}
}
